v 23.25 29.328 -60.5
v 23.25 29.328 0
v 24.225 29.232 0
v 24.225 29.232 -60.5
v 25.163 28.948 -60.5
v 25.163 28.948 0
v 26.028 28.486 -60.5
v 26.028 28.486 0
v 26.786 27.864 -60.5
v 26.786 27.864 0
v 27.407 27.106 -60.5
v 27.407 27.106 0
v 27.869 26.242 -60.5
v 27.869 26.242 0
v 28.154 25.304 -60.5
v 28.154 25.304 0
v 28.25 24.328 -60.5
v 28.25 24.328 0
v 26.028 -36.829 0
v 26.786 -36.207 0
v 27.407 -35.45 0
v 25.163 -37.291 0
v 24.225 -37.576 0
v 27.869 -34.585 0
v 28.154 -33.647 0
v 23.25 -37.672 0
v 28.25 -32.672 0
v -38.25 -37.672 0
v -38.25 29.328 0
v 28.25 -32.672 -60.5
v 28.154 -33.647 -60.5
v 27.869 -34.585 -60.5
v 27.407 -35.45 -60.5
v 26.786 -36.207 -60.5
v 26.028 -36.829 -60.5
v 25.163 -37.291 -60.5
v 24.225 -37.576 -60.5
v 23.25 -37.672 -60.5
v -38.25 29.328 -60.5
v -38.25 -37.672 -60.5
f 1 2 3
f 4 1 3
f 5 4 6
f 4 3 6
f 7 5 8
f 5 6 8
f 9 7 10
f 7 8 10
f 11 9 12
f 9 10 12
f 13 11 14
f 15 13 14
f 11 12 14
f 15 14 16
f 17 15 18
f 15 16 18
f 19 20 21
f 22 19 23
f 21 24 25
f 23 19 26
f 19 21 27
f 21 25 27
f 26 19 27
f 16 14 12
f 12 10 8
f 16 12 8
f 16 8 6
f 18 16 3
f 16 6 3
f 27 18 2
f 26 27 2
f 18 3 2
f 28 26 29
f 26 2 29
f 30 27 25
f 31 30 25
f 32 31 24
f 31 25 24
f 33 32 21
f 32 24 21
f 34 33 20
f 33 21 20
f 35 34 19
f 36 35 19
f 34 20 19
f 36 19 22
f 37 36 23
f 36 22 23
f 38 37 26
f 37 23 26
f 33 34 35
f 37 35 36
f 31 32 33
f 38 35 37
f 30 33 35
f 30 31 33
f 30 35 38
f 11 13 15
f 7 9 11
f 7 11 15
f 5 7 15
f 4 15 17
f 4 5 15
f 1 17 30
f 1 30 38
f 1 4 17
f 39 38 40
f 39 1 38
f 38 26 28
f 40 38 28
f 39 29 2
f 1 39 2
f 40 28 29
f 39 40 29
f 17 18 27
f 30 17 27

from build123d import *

# Parameters (mm, degrees)
EXTRUDE_1_DEPTH = 60.5


with BuildPart() as part:
    # 草图1 → 凸台-拉伸1 (new body)
    with BuildSketch(Plane.XY):
        with BuildLine():
            Line((-38.25, 29.328205128), (23.25, 29.328205128))
            ThreePointArc((23.25, 29.328205128), (26.785533906, 27.863739034), (28.25, 24.328205128))
            Line((28.25, 24.328205128), (28.25, -32.671794872))
            ThreePointArc((28.25, -32.671794872), (26.785533906, -36.207328778), (23.25, -37.671794872))
            Line((23.25, -37.671794872), (-38.25, -37.671794872))
            Line((-38.25, -37.671794872), (-38.25, 29.328205128))
        make_face()
    extrude(amount=-EXTRUDE_1_DEPTH)


solid = part.part
